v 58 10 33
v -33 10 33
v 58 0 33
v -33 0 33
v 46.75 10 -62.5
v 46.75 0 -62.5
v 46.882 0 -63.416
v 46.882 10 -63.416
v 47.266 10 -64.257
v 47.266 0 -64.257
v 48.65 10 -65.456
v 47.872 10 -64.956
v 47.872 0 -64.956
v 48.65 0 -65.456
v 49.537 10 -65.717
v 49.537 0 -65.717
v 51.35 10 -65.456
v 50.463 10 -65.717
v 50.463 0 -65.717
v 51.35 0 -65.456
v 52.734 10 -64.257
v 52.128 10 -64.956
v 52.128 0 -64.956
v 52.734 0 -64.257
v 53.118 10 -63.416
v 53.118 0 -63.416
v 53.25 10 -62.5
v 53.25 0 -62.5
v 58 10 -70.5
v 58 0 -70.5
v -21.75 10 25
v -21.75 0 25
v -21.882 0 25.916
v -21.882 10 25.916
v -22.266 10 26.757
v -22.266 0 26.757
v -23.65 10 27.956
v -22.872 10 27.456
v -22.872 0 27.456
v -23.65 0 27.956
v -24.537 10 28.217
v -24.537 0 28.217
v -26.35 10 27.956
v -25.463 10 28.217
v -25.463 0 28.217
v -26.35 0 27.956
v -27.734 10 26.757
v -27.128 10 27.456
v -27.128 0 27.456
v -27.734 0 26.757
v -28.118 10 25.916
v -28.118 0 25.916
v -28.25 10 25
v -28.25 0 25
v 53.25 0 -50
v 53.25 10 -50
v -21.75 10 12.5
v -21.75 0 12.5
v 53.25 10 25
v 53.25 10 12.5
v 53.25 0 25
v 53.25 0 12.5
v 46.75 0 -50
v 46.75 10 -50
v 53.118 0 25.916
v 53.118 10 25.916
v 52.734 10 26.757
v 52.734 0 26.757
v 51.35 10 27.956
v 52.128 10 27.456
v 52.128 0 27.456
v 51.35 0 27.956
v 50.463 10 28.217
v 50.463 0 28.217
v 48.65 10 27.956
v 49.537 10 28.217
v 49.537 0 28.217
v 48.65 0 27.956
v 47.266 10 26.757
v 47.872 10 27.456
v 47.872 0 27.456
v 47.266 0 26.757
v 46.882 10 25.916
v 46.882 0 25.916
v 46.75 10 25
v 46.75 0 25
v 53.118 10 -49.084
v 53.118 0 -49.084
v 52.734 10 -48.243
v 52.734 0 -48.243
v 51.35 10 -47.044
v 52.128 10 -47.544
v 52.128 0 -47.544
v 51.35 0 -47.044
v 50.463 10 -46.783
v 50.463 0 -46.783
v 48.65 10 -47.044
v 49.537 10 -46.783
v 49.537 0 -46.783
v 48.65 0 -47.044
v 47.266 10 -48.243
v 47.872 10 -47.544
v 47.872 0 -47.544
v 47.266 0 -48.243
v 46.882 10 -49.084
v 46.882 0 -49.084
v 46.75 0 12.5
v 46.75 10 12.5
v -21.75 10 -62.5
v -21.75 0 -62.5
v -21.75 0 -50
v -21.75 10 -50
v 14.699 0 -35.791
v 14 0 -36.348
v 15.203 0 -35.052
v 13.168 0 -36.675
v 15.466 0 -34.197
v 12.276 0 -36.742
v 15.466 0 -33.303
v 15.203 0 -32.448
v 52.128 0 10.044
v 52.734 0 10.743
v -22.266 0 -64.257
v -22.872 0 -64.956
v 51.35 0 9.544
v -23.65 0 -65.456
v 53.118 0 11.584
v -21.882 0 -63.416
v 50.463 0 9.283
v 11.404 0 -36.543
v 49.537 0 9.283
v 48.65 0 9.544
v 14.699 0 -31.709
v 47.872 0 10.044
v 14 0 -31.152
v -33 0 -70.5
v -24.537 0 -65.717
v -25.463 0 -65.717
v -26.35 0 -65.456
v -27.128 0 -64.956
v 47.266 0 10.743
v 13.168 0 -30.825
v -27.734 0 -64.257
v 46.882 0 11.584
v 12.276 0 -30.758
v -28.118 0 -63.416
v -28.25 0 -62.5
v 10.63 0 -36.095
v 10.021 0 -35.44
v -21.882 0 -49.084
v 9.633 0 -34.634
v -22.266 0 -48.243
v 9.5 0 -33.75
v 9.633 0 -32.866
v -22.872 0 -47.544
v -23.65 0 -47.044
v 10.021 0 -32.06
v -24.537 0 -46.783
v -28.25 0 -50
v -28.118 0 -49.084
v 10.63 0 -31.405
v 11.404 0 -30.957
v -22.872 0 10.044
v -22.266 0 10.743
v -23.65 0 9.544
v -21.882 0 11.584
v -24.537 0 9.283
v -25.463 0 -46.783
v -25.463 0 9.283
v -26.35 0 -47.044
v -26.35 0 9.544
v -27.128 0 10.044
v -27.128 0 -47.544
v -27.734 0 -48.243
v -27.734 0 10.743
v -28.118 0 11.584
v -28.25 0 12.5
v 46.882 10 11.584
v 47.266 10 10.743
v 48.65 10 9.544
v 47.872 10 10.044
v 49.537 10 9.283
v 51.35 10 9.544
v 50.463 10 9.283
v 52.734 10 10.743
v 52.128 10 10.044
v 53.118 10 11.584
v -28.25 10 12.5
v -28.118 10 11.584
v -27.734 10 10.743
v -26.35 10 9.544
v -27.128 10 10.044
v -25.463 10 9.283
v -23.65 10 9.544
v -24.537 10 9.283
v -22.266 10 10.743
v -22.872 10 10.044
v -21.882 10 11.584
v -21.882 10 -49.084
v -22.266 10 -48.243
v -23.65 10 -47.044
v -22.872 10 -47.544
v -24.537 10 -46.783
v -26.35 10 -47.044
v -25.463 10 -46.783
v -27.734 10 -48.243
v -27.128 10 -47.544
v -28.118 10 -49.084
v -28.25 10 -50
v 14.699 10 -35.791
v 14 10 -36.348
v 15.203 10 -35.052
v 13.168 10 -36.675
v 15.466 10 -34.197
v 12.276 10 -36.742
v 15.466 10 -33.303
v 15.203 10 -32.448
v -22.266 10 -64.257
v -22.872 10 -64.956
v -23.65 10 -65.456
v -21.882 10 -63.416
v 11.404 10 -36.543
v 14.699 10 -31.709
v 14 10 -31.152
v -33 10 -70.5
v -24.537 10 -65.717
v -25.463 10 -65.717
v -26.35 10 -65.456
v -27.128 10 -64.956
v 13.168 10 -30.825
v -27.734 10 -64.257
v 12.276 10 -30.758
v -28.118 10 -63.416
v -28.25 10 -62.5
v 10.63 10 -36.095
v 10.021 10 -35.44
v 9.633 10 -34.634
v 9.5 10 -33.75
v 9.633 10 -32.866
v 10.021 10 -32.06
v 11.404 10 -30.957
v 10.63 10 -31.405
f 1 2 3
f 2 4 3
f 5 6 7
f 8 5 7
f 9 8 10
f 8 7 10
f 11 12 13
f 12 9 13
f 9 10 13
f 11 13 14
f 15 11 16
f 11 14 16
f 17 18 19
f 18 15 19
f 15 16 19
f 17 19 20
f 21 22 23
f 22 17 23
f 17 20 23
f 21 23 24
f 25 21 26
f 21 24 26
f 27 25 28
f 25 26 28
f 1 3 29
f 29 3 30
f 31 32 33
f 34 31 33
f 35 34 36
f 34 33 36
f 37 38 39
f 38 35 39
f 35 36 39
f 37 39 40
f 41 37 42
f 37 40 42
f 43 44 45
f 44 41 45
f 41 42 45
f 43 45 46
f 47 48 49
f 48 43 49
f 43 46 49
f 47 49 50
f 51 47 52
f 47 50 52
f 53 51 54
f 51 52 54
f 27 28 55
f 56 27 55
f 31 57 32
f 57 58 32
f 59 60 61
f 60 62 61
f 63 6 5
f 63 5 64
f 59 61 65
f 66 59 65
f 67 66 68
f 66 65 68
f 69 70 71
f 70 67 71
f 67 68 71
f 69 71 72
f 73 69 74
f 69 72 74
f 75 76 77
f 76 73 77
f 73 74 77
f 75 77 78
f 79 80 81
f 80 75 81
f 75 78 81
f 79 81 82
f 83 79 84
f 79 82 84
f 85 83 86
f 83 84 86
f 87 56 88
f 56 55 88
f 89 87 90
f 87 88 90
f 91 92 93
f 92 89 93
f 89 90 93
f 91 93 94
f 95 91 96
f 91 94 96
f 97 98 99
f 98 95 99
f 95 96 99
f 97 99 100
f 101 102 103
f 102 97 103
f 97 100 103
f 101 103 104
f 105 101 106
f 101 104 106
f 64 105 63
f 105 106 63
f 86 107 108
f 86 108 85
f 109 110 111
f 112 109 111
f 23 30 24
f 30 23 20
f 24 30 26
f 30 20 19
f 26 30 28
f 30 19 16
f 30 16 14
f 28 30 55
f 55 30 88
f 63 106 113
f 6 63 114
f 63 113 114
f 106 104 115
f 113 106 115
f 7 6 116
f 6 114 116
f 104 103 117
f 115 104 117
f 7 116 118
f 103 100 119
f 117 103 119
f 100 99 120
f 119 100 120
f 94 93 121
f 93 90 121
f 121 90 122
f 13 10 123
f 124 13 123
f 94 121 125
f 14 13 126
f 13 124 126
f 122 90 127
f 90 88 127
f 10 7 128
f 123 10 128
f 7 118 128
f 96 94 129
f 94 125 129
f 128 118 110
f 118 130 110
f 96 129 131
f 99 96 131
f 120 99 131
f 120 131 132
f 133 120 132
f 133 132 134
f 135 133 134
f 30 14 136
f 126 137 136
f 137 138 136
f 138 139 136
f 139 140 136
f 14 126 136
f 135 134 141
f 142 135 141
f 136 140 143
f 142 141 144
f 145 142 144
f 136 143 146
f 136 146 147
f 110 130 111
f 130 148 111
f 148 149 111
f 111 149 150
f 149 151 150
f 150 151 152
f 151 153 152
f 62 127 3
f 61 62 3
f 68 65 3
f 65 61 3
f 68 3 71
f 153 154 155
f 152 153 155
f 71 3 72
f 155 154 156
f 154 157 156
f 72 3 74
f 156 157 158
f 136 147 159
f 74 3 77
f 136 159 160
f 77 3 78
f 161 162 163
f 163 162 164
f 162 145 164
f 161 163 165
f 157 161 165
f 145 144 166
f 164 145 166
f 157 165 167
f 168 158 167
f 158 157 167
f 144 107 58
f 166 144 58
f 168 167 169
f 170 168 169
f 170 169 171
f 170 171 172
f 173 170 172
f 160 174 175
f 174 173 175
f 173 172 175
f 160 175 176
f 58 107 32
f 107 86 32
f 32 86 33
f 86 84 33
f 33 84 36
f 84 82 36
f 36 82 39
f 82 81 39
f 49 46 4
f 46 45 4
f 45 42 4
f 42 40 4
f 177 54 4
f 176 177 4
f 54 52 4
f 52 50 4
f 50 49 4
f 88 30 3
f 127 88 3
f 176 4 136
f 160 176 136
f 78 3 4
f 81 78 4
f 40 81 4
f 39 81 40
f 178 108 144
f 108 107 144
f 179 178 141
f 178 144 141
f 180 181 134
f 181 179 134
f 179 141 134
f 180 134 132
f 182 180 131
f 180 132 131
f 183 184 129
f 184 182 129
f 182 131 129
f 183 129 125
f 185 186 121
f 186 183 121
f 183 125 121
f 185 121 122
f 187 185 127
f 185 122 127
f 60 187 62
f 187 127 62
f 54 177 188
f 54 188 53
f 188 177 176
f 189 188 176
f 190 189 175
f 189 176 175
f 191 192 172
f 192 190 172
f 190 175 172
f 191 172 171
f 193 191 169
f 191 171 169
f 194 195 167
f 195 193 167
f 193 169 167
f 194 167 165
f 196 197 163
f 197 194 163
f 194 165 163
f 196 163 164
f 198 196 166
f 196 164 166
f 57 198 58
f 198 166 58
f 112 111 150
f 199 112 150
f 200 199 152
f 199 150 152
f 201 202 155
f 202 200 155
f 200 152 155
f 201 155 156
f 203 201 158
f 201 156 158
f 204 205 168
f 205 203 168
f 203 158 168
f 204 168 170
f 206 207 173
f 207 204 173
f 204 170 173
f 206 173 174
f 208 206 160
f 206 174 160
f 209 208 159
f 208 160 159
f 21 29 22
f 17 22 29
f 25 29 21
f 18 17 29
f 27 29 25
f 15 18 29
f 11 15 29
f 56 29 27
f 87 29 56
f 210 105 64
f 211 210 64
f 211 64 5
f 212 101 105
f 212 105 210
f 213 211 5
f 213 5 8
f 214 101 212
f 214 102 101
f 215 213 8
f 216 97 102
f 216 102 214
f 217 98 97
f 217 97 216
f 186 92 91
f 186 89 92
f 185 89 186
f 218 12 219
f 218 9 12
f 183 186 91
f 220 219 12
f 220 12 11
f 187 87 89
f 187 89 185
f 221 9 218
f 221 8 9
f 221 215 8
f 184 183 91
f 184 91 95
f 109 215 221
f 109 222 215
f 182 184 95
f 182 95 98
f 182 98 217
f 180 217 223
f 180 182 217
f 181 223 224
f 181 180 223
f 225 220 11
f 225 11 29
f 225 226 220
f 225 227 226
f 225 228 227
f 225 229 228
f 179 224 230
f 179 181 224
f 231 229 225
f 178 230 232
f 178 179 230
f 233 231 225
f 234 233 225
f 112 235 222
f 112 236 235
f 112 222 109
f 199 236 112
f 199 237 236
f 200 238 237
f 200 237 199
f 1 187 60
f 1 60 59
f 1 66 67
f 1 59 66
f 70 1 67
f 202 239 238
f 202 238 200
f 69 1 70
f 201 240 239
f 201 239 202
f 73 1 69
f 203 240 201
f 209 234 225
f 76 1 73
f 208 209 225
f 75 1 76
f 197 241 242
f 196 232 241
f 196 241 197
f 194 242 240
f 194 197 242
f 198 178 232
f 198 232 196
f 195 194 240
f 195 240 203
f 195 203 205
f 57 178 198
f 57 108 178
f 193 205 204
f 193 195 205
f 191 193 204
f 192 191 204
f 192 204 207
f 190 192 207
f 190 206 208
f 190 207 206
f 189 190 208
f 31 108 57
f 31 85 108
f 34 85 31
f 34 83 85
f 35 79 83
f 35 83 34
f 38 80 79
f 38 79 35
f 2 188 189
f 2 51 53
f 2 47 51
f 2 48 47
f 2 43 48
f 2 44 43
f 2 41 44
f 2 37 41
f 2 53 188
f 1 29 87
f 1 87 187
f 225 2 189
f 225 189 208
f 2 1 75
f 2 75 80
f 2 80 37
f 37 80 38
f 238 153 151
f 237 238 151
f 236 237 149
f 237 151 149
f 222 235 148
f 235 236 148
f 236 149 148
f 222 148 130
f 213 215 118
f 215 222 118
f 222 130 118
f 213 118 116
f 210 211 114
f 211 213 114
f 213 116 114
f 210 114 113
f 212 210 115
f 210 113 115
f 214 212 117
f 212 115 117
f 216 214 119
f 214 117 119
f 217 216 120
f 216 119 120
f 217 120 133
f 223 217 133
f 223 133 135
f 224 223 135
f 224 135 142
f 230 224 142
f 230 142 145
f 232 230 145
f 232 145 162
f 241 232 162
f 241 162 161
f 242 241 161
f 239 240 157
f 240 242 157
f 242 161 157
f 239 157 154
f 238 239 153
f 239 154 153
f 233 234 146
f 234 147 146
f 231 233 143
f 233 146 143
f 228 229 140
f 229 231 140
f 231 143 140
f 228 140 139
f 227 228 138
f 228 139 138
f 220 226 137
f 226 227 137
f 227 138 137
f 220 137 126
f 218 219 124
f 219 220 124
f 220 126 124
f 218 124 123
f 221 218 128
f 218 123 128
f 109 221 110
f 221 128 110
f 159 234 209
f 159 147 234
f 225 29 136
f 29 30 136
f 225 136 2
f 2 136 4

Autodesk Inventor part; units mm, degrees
ref_plane "YZ Plane" through (0, 0, 0) normal (1, 0, 0) x (0, 1, 0)
ref_plane "XZ Plane" through (0, 0, 0) normal (0, 1, 0) x (-1, 0, 0)
ref_plane "XY Plane" through (0, 0, 0) normal (0, 0, 1) x (1, 0, 0)
sketch "Sketch2" plane through (0, 0, 0) normal (0, 1, 0) x (-1, 0, 0)
  arc A0 (21.75, 12.5) -> (28.25, 12.5) centre (25, 12.5) ccw
  line L0 (28.25, 12.5) -> (21.75, 12.5) construction
  line L1 (28.25, 12.5) -> (34.75, 12.5) construction
  line L2 (28.25, 12.5) -> (28.25, 25)
  line L3 (28.25, 12.5) -> (40.75, 12.5) construction
  line L4 (21.75, 12.5) -> (21.75, 25)
  line L5 (21.75, 12.5) -> (34.25, 12.5) construction
  arc A1 (28.25, 25) -> (21.75, 25) centre (25, 25) ccw
  arc A2 (-53.25, 12.5) -> (-46.75, 12.5) centre (-50, 12.5) ccw
  line L6 (-46.75, 12.5) -> (-53.25, 12.5) construction
  line L7 (-46.75, 12.5) -> (-40.25, 12.5) construction
  line L8 (-46.75, 12.5) -> (-46.75, 25)
  line L9 (-46.75, 12.5) -> (-34.25, 12.5) construction
  line L10 (-53.25, 12.5) -> (-53.25, 25)
  line L11 (-53.25, 12.5) -> (-40.75, 12.5) construction
  arc A3 (-46.75, 25) -> (-53.25, 25) centre (-50, 25) ccw
  arc A4 (-53.25, -62.5) -> (-46.75, -62.5) centre (-50, -62.5) ccw
  line L12 (-46.75, -62.5) -> (-53.25, -62.5) construction
  line L13 (-46.75, -62.5) -> (-40.25, -62.5) construction
  line L14 (-46.75, -62.5) -> (-46.75, -50)
  line L15 (-46.75, -62.5) -> (-34.25, -62.5) construction
  line L16 (-53.25, -62.5) -> (-53.25, -50)
  line L17 (-53.25, -62.5) -> (-40.75, -62.5) construction
  arc A5 (-46.75, -50) -> (-53.25, -50) centre (-50, -50) ccw
  line L18 (28.25, -62.5) -> (40.75, -62.5) construction
  line L19 (28.25, -62.5) -> (34.75, -62.5) construction
  line L20 (28.25, -62.5) -> (28.25, -50)
  line L21 (21.75, -62.5) -> (34.25, -62.5) construction
  arc A6 (21.75, -62.5) -> (28.25, -62.5) centre (25, -62.5) ccw
  line L22 (28.25, -62.5) -> (21.75, -62.5) construction
  line L23 (21.75, -62.5) -> (21.75, -50)
  arc A7 (28.25, -50) -> (21.75, -50) centre (25, -50) ccw
  line L24 (33, 33) -> (-58, 33)
  line L25 (-58, 33) -> (-58, -70.5)
  line L26 (-58, -70.5) -> (33, -70.5)
  line L27 (33, -70.5) -> (33, 33)
  circle A8 centre (-12.5, -33.75) radius 3
  point P0 (0, 0)
  dimension "d25" = 6.5
  dimension "d26" = 180
  dimension "d27" = 3.25
  dimension "d28" = 12.5
  dimension "d29" = 90
  dimension "d30" = 12.5
  dimension "d31" = 90
  dimension "d32" = 3.25
  dimension "d33" = 6.5
  dimension "d34" = 180
  dimension "d35" = 3.25
  dimension "d36" = 12.5
  dimension "d37" = 90
  dimension "d38" = 12.5
  dimension "d39" = 90
  dimension "d40" = 3.25
  dimension "d41" = 25
  dimension "d42" = 25
  dimension "d43" = 6.5
  dimension "d44" = 180
  dimension "d45" = 3.25
  dimension "d46" = 12.5
  dimension "d47" = 90
  dimension "d48" = 12.5
  dimension "d49" = 90
  dimension "d50" = 3.25
  dimension "d51" = 6.5
  dimension "d52" = 180
  dimension "d53" = 3.25
  dimension "d54" = 12.5
  dimension "d55" = 90
  dimension "d56" = 12.5
  dimension "d57" = 90
  dimension "d58" = 3.25
  dimension "d59" = 75
  dimension "d60" = 0
  dimension "d61" = 75
  dimension "d62" = 0
  dimension "d63" = 75
  dimension "d64" = 75
  dimension "d65" = 8
  dimension "d66" = 8
  dimension "d67" = 8
  dimension "d68" = 8
  dimension "d71" = 6
  dimension "d76" = 16.25
  dimension "d77" = 37.5
extrude "Extrusion2" add sketch "Sketch2" along normal blind 10
properties part number "StepperAdapter"
